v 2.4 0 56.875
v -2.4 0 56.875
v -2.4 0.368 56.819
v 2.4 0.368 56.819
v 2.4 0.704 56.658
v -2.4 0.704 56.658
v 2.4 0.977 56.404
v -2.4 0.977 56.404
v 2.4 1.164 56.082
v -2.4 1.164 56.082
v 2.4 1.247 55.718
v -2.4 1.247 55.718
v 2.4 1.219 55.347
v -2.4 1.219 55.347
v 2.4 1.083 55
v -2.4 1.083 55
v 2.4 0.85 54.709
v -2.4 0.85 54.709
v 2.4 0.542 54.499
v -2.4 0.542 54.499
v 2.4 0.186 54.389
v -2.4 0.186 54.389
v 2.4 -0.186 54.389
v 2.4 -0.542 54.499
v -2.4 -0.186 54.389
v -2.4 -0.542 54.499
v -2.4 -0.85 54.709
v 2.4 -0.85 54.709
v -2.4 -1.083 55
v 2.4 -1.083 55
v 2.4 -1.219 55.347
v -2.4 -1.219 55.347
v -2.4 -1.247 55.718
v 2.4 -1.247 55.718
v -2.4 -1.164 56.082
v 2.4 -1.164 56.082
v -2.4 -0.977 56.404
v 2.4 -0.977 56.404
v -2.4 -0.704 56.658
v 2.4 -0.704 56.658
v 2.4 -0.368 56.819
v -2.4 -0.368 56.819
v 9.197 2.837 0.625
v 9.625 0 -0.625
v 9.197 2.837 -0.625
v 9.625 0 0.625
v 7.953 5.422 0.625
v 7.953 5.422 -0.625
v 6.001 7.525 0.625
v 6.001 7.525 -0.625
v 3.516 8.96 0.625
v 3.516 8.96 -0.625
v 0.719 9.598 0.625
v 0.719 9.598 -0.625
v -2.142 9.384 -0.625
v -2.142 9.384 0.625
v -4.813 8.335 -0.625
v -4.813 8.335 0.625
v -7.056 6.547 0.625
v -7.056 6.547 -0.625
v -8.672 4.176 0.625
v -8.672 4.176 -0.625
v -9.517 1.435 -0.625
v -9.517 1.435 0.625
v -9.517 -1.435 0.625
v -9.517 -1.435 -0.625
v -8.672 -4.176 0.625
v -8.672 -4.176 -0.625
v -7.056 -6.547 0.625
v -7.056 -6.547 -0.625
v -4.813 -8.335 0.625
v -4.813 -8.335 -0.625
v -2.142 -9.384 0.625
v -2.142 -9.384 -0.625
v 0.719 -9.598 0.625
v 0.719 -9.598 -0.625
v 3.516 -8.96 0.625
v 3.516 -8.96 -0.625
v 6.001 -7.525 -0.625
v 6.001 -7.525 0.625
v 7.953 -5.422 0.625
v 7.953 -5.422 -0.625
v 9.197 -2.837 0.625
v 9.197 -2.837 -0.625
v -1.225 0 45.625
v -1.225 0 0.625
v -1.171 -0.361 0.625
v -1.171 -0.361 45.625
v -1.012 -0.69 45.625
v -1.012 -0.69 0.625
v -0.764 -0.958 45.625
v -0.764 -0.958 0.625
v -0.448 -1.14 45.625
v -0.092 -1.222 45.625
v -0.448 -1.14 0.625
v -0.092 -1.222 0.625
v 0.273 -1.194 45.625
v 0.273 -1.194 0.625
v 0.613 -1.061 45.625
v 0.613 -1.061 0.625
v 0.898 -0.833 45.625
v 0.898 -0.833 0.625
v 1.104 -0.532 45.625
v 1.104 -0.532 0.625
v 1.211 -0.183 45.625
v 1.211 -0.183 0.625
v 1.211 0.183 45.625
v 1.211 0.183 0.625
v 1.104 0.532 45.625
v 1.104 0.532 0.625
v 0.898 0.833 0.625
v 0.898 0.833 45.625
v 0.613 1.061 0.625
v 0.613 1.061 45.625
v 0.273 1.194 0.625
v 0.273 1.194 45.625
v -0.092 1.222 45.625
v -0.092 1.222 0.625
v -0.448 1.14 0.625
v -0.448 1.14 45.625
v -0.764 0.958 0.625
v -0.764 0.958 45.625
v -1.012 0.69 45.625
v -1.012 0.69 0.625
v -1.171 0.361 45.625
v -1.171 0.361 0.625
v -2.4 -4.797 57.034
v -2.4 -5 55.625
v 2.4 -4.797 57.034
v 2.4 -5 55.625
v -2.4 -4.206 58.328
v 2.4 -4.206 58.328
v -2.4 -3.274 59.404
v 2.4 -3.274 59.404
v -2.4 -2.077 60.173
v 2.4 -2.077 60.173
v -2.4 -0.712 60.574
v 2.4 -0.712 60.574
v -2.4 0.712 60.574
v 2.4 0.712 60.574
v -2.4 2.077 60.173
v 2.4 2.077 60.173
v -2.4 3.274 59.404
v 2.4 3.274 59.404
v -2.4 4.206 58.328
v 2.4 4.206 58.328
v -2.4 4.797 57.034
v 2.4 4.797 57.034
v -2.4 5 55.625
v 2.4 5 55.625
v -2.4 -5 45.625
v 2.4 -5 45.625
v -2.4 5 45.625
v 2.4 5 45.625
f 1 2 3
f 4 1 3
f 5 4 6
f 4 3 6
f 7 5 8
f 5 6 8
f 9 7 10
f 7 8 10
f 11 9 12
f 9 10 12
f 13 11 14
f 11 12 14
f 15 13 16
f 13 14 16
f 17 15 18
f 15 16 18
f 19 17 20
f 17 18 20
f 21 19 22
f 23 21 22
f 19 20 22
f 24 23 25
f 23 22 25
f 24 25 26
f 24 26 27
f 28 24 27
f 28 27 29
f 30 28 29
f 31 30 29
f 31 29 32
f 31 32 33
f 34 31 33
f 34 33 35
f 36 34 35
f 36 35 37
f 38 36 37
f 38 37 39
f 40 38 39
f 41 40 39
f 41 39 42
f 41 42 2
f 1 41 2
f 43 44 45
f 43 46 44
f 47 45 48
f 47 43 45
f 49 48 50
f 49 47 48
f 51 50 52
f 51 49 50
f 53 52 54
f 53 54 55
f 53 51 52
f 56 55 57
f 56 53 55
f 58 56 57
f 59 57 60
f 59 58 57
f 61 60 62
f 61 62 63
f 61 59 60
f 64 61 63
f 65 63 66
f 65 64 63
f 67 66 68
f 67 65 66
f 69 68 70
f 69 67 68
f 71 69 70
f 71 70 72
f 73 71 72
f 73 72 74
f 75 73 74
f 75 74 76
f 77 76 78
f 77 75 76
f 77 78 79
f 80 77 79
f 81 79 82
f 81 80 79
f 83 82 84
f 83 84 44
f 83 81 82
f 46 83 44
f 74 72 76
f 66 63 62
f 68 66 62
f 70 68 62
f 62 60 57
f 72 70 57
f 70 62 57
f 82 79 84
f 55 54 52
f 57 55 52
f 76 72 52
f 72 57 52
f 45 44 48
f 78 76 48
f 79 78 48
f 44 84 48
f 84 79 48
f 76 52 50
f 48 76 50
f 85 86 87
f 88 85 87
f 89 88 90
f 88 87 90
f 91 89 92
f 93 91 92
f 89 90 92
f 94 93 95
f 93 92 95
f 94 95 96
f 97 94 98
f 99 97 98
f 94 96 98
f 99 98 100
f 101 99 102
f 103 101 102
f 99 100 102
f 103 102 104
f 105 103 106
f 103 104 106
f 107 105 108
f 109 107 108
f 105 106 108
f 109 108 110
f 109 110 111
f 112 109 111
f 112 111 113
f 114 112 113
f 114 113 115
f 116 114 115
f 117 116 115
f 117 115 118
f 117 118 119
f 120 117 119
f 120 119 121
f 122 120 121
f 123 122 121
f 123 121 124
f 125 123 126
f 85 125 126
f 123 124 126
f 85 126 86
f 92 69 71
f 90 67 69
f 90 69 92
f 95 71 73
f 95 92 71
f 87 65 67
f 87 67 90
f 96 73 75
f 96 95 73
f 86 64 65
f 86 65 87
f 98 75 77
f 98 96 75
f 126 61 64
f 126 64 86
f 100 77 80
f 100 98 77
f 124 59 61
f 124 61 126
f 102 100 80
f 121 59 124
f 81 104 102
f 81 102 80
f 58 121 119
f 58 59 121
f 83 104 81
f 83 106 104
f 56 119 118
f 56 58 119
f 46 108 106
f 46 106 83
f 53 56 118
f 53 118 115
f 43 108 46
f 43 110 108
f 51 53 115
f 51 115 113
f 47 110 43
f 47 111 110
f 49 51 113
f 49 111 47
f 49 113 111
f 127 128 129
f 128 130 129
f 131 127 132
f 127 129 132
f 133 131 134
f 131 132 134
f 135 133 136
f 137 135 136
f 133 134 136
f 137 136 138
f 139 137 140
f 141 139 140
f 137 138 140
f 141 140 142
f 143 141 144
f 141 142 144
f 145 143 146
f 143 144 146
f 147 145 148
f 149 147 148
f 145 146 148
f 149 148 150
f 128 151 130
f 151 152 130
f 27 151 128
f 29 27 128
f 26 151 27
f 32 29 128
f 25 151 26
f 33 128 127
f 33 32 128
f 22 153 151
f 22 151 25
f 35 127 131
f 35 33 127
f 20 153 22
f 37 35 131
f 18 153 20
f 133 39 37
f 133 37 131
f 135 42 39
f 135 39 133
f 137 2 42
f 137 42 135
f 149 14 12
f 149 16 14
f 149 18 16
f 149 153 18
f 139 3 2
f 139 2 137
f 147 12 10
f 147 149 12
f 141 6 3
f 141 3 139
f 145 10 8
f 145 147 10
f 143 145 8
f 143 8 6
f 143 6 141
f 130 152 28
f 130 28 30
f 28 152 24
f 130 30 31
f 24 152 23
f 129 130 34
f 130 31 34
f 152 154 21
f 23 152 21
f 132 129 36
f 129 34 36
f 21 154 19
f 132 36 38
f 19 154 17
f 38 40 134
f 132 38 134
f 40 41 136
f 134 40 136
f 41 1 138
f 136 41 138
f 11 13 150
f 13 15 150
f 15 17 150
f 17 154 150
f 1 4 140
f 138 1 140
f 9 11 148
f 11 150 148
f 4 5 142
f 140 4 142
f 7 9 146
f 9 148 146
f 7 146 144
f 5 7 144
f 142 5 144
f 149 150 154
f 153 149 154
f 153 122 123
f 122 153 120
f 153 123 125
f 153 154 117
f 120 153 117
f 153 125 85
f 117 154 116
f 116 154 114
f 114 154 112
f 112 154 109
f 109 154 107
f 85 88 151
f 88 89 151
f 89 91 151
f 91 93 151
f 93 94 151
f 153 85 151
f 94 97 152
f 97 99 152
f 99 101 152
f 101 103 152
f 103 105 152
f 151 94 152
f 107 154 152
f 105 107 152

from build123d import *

# Parameters (mm, degrees)
SKETCH1_R           = 9.625
BOSS_EXTRUDE1_DEPTH = 0.625
SKETCH2_R           = 1.225
BOSS_EXTRUDE2_DEPTH = 45
BOSS_EXTRUDE3_DEPTH = 2.4
SKETCH4_R           = 1.25
CUT_EXTRUDE1_DEPTH  = 10


with BuildPart() as part:
    # Sketch1 → Boss-Extrude1 (new, symmetric)
    with BuildSketch(Plane.XY):
        Circle(SKETCH1_R)
    extrude(amount=BOSS_EXTRUDE1_DEPTH, both=True)

    # Sketch2 → Boss-Extrude2 (add)
    with BuildSketch(Plane.XY.offset(0.625)):
        Circle(SKETCH2_R)
    extrude(amount=BOSS_EXTRUDE2_DEPTH)

    # Sketch3 → Boss-Extrude3 (add, symmetric)
    with BuildSketch(Plane(origin=(0, 0, 0), x_dir=(0, 0, -1), z_dir=(1, 0, 0))):
        with BuildLine():
            Line((-45.625, 5), (-45.625, -5))
            Line((-45.625, -5), (-55.625, -5))
            ThreePointArc((-55.625, -5), (-60.625, 0), (-55.625, 5))
            Line((-55.625, 5), (-45.625, 5))
        make_face()
    extrude(amount=BOSS_EXTRUDE3_DEPTH, both=True)

    # Sketch4 → Cut-Extrude1 (cut)
    with BuildSketch(Plane.ZY.offset(2.4)):
        with Locations((55.625, 0)):
            Circle(SKETCH4_R)
    extrude(amount=-CUT_EXTRUDE1_DEPTH, mode=Mode.SUBTRACT)


solid = part.part
